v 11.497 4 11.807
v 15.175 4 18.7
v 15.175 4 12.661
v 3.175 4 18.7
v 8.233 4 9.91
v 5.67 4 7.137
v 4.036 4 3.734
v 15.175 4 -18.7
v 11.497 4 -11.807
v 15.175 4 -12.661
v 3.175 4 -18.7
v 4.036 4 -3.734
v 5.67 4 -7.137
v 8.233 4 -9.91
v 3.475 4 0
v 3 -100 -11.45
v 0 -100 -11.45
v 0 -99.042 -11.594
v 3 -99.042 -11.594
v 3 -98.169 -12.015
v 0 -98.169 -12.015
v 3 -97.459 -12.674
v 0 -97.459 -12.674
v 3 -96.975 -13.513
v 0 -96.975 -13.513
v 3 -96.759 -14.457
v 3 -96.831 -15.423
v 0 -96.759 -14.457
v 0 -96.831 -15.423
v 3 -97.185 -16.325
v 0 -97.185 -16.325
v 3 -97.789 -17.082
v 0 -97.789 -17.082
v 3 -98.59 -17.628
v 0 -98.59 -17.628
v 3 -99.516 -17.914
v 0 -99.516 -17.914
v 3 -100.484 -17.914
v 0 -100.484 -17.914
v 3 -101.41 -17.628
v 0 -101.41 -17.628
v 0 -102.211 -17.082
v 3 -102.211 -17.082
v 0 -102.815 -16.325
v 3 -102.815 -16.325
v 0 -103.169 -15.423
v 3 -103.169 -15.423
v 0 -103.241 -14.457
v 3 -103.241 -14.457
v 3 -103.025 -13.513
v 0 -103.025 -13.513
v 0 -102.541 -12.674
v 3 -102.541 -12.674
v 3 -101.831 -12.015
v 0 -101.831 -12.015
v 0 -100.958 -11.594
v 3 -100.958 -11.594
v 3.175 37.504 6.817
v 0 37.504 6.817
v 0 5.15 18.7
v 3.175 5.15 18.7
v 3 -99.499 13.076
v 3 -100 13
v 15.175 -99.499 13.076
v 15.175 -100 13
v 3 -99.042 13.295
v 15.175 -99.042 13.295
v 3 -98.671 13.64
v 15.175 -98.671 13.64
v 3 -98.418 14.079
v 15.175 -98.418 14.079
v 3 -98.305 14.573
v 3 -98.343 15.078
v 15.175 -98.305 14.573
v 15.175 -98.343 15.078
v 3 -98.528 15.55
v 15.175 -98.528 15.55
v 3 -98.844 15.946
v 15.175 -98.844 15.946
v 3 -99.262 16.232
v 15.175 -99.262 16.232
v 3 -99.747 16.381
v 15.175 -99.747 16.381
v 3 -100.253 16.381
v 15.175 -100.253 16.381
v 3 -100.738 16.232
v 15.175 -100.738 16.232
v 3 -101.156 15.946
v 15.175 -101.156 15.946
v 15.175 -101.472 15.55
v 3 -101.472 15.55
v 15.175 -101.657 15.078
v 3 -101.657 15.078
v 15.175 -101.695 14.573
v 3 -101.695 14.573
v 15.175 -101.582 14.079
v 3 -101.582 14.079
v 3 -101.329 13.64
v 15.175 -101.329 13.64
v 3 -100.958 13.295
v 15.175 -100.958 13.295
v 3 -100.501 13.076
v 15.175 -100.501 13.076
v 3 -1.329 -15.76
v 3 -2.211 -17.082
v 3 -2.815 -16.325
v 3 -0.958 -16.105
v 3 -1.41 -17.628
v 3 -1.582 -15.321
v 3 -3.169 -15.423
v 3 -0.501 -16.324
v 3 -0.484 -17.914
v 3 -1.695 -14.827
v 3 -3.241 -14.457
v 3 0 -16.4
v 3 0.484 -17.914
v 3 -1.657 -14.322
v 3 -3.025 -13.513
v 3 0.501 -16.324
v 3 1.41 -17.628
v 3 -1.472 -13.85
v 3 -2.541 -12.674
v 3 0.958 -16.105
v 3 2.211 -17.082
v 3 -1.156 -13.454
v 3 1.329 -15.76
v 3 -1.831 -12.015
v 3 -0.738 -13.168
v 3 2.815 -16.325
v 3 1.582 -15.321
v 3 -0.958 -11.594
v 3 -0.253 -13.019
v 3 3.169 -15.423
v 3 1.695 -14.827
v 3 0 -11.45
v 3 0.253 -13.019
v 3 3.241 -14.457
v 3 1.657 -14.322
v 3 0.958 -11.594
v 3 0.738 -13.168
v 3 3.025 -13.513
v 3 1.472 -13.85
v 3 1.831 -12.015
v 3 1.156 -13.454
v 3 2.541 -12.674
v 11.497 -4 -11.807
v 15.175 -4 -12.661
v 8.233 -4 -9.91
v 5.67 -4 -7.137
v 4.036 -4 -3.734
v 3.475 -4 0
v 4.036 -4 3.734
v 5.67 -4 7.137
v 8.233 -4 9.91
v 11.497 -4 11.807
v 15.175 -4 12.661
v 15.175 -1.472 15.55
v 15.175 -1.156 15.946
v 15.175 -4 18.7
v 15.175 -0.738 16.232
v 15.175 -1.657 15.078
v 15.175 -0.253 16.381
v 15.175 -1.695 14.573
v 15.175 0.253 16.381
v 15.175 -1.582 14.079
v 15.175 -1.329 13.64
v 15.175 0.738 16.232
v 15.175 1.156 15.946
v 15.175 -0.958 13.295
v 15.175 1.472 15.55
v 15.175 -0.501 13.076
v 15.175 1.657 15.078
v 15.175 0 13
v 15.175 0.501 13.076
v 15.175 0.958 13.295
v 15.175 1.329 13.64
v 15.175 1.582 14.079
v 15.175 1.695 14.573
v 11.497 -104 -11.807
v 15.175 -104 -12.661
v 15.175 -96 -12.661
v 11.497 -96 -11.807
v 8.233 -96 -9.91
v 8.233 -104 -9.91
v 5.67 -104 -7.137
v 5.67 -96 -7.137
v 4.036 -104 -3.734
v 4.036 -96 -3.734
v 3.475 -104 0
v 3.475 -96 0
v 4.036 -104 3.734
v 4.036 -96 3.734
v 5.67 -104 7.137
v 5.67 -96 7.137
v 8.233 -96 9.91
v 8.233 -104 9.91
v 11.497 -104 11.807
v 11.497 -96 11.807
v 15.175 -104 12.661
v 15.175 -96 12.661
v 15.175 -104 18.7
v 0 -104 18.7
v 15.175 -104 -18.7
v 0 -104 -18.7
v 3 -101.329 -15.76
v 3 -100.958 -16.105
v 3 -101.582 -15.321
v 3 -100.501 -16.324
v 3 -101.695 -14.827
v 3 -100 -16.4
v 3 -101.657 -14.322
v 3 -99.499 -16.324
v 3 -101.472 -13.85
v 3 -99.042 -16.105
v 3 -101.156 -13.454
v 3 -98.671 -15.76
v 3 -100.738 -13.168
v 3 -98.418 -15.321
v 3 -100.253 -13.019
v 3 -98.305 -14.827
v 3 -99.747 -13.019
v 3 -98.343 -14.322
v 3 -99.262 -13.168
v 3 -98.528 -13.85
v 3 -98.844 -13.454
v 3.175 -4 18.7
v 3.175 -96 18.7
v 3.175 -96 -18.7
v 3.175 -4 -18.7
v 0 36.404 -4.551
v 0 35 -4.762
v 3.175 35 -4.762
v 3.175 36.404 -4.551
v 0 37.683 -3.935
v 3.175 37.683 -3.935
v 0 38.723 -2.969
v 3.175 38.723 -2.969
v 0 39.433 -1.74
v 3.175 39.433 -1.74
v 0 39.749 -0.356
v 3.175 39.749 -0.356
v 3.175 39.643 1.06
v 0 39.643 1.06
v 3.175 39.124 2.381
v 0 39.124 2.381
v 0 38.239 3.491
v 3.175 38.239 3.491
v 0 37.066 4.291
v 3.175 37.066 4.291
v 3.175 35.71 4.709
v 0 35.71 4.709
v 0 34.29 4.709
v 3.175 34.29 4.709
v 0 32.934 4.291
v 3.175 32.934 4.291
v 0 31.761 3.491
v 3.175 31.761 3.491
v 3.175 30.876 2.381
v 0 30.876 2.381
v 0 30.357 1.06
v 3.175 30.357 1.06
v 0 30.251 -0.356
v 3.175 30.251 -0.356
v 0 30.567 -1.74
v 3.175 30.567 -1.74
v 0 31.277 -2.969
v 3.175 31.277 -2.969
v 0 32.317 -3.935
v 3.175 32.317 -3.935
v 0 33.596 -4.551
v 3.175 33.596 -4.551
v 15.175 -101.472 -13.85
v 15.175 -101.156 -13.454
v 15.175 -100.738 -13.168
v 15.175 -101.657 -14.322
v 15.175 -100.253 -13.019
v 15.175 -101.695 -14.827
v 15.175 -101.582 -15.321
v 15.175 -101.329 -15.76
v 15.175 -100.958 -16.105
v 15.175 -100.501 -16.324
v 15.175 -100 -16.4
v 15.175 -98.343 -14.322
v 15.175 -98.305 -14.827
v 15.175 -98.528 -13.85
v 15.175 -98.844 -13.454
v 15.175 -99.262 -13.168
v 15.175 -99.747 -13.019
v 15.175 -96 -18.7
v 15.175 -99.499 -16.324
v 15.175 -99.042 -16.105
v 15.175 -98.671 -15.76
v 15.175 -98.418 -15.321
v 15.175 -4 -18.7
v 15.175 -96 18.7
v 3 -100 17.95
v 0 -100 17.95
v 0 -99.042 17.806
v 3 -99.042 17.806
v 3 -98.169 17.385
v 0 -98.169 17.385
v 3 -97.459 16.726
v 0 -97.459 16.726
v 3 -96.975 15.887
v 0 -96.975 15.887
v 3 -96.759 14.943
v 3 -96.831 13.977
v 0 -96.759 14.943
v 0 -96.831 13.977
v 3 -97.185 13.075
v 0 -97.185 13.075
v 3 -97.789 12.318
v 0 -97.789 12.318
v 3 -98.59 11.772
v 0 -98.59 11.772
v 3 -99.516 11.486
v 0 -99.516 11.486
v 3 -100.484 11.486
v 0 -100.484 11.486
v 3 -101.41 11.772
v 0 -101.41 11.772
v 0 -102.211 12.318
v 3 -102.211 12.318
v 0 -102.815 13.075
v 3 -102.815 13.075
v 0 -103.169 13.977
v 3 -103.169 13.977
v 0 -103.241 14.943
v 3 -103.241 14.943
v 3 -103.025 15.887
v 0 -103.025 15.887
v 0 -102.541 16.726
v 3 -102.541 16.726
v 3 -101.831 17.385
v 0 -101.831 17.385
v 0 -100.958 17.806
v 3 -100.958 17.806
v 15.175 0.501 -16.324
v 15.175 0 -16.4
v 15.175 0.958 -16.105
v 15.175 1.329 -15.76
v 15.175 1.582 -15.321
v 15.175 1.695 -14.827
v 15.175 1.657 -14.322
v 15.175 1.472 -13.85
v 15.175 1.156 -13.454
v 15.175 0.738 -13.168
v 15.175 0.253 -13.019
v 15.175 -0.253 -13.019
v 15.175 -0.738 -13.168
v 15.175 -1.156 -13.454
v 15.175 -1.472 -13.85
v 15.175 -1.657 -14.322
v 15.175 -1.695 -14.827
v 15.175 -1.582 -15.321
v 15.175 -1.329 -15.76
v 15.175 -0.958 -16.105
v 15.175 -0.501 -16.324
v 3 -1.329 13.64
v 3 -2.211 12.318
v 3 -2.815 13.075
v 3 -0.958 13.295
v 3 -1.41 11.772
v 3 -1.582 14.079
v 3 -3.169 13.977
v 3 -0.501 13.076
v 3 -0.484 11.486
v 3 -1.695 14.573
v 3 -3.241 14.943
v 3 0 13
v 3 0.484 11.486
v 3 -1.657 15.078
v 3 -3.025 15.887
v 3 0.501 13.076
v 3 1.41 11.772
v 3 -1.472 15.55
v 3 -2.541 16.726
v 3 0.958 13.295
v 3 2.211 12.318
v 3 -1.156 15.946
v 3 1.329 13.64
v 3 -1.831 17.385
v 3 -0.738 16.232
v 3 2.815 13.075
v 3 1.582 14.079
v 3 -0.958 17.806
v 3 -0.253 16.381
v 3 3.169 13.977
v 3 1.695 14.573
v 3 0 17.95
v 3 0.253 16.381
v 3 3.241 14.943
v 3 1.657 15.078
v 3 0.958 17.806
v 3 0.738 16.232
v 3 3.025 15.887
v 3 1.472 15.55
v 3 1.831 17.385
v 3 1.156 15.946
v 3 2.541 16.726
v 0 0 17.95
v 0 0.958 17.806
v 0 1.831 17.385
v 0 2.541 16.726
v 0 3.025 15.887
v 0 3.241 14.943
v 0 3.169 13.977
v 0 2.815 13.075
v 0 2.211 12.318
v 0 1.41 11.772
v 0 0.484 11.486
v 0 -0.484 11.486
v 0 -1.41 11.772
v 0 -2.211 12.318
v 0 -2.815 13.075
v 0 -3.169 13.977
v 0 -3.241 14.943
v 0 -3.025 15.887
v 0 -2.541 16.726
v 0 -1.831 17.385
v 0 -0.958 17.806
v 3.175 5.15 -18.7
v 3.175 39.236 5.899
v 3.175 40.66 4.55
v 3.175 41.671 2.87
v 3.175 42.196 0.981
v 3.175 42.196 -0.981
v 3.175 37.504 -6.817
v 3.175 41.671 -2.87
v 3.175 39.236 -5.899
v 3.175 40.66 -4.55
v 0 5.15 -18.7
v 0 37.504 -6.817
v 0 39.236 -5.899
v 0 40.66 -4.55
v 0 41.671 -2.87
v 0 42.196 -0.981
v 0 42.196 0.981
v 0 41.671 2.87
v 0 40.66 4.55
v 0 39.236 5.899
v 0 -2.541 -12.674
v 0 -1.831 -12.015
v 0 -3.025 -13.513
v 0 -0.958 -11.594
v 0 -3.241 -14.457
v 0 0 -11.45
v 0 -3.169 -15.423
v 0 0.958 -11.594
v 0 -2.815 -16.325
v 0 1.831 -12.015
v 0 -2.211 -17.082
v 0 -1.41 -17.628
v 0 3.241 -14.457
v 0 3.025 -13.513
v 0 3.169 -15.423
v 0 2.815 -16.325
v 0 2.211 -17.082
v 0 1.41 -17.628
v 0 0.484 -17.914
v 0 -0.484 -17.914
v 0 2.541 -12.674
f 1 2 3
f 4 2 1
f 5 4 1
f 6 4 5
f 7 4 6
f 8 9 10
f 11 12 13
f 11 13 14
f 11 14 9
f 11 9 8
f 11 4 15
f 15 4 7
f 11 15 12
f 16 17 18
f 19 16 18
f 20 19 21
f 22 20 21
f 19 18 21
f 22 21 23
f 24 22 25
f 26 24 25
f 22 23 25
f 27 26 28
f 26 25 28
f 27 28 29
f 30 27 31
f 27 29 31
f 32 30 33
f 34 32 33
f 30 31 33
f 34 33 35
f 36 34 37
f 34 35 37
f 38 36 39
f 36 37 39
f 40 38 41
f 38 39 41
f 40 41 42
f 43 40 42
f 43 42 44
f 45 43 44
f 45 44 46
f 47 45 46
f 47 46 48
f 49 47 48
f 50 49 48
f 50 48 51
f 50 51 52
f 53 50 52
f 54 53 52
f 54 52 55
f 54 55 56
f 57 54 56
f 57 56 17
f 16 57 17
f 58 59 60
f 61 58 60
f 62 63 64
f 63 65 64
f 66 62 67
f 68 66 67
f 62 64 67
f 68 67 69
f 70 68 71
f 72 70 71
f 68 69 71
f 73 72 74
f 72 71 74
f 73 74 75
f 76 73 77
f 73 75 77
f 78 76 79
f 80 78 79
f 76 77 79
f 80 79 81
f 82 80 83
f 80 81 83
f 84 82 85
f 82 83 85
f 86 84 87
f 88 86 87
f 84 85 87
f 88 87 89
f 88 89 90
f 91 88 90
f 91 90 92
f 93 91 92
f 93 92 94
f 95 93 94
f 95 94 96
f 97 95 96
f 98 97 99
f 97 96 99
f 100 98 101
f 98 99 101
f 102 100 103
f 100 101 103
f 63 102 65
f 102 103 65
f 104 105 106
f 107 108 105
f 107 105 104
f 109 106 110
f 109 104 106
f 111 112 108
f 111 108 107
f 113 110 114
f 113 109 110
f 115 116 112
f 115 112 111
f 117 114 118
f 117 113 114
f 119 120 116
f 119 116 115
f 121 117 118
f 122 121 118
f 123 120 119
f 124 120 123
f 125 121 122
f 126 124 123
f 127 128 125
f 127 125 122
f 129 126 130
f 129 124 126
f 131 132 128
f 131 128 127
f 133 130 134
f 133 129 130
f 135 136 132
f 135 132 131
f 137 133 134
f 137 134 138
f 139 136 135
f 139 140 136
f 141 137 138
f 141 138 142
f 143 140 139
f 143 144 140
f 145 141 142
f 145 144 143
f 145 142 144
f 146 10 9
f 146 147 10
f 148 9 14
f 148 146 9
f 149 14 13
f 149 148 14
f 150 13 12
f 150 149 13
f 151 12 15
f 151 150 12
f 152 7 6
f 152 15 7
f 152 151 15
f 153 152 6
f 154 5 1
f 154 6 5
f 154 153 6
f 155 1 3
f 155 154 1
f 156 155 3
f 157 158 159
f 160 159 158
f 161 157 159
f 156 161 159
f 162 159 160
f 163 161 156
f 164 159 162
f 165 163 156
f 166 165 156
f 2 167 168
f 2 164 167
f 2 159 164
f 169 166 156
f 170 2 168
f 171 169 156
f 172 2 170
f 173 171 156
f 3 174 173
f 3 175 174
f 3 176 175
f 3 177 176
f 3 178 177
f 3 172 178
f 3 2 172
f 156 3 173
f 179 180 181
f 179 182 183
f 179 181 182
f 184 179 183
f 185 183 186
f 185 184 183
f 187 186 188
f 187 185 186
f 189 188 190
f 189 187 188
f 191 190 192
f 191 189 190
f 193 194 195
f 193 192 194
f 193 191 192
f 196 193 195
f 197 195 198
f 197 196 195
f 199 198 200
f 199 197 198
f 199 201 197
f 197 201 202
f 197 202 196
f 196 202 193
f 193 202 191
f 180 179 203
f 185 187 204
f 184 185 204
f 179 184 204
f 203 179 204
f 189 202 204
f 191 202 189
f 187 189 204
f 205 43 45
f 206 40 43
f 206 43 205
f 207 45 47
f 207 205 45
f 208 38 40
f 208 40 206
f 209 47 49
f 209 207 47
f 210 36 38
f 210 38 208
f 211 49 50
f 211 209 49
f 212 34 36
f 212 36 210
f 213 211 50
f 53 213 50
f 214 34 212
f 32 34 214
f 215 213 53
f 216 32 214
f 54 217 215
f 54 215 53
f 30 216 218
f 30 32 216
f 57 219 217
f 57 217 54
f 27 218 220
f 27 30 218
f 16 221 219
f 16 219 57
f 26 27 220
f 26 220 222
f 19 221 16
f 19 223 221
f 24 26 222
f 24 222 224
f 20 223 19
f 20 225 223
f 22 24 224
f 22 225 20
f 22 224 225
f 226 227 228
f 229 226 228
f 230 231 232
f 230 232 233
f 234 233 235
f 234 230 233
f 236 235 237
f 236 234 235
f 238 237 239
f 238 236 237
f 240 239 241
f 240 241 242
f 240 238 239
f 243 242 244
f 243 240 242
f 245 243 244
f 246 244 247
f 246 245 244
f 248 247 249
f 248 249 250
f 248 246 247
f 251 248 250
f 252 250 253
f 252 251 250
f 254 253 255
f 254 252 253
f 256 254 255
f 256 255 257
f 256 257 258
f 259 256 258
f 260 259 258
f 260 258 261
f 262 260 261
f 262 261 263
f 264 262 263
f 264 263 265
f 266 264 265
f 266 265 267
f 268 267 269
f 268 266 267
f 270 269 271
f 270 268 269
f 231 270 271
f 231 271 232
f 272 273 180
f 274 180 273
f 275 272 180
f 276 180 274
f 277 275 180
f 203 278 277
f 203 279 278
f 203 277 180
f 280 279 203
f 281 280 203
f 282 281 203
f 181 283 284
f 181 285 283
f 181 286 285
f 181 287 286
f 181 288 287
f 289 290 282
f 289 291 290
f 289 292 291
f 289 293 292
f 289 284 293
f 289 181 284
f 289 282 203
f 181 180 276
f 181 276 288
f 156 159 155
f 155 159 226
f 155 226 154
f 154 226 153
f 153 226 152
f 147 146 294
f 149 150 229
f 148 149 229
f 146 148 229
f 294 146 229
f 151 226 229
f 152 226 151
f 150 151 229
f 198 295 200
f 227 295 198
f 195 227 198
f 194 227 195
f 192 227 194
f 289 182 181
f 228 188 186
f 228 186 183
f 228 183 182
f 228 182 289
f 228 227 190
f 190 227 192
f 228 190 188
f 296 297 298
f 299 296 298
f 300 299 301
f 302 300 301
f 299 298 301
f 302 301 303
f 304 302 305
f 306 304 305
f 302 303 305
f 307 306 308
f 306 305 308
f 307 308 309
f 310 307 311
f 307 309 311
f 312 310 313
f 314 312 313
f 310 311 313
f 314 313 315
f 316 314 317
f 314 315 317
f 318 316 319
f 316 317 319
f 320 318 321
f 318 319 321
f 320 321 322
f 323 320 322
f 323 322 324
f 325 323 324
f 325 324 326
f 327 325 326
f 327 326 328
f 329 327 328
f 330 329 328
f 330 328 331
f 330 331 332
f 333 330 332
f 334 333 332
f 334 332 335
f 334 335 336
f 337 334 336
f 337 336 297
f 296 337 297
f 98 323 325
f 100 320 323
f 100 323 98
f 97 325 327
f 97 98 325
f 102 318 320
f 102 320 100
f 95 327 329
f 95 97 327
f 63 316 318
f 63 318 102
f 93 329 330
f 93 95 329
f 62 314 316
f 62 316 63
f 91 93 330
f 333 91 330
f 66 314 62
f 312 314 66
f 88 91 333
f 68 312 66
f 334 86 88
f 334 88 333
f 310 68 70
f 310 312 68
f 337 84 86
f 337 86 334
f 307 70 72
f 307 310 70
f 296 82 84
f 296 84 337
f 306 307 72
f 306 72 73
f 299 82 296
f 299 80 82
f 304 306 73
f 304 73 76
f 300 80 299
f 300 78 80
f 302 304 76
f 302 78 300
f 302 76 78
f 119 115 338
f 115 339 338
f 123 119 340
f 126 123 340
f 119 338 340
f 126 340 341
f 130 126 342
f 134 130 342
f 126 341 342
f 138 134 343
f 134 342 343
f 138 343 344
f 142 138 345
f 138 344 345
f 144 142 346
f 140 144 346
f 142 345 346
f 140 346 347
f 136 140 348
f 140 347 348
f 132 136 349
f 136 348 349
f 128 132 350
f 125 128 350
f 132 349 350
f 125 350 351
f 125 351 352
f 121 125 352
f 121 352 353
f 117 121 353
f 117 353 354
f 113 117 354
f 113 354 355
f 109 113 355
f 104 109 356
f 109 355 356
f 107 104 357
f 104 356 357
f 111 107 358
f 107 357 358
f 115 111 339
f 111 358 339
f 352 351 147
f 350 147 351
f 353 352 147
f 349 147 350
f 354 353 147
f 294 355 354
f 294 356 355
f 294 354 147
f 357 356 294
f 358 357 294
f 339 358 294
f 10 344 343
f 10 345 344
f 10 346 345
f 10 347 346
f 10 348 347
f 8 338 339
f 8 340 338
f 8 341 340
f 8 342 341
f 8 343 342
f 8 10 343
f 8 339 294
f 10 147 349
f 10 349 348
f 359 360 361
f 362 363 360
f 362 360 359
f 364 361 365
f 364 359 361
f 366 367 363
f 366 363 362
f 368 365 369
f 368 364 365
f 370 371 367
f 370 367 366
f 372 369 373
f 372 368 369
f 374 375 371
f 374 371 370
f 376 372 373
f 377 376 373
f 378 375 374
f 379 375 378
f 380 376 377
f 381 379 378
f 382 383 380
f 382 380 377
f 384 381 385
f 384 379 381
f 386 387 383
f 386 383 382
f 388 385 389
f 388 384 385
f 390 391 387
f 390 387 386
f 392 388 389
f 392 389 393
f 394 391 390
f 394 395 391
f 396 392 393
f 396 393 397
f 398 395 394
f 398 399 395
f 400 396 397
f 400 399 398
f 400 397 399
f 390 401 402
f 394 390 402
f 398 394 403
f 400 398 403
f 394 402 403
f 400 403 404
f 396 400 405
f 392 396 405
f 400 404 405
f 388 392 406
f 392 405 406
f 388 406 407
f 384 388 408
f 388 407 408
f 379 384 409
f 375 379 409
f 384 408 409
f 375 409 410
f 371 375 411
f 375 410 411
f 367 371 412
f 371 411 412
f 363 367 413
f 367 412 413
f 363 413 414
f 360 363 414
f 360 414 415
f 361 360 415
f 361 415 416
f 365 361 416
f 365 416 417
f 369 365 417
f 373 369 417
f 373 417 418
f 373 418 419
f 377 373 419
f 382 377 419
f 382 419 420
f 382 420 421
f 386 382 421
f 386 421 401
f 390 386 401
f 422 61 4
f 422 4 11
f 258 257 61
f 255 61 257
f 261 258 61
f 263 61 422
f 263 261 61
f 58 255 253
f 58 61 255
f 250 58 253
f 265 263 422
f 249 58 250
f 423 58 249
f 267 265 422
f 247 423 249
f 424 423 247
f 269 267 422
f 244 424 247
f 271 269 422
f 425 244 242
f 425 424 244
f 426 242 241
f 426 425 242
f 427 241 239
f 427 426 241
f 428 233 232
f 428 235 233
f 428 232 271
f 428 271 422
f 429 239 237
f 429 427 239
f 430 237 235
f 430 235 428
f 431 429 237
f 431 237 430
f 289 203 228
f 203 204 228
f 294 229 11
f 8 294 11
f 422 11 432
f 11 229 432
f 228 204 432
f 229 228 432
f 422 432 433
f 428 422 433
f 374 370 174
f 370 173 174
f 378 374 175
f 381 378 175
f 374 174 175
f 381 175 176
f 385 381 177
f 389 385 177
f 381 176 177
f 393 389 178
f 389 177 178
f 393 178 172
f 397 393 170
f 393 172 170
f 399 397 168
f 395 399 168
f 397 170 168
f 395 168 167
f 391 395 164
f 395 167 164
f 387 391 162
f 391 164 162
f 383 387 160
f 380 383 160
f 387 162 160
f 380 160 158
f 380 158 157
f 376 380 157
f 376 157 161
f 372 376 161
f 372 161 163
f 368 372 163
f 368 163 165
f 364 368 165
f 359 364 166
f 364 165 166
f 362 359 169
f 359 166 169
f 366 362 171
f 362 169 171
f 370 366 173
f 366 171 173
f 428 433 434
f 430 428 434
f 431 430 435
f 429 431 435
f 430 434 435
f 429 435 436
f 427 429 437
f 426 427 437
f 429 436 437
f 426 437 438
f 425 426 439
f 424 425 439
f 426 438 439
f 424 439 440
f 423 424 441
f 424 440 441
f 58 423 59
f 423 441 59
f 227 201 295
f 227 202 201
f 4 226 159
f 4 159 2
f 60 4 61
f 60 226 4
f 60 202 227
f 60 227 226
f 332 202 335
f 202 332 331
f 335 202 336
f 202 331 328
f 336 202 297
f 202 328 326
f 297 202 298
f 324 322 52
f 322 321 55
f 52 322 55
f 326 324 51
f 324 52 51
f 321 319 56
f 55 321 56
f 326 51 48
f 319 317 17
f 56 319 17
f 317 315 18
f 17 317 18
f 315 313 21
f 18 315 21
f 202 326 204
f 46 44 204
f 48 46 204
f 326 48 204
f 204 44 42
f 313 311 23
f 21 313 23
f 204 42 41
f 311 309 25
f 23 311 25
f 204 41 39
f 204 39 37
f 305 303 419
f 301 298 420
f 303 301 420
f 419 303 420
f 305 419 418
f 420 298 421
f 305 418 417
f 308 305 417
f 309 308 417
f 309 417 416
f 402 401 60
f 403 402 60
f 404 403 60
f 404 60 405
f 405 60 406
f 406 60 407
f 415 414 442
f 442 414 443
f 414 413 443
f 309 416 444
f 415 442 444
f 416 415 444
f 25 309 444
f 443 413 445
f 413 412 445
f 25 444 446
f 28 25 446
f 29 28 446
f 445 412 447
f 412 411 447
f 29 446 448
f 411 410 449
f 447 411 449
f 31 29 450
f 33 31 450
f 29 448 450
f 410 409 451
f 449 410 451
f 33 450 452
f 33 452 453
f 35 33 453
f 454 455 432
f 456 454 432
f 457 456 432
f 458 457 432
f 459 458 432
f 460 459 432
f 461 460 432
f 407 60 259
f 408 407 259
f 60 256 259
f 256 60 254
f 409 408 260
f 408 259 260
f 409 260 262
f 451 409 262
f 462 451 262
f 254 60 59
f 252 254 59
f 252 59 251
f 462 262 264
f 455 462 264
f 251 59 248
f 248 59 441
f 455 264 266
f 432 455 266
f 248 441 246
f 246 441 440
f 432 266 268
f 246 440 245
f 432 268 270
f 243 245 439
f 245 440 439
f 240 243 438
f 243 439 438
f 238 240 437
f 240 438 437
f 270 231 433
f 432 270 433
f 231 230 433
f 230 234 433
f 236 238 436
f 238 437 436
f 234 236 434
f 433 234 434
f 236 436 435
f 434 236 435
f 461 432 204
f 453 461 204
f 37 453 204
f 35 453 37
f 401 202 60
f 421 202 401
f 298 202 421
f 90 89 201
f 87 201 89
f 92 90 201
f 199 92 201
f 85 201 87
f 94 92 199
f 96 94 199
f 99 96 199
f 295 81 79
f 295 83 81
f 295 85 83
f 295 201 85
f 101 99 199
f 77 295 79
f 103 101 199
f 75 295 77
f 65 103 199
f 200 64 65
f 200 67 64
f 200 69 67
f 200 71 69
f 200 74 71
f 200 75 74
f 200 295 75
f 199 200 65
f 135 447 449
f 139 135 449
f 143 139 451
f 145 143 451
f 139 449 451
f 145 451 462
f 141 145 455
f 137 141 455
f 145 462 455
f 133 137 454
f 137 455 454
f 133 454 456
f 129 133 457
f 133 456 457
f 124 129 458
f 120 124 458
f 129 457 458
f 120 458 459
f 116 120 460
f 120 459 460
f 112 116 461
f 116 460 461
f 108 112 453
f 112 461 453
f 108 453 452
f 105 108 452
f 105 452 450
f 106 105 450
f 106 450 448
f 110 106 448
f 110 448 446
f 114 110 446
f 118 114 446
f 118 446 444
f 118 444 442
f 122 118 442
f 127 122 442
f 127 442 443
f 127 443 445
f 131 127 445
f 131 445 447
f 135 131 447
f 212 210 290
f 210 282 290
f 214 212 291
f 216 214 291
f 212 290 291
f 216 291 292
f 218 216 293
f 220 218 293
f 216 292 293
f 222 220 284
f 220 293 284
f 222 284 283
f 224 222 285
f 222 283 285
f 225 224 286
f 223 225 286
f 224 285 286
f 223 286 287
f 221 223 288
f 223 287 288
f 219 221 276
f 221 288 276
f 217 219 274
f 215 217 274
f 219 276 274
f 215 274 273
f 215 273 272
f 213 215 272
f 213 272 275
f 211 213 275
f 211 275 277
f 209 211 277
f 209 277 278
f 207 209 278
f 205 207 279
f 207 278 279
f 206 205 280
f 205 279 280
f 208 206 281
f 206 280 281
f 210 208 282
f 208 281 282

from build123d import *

# Parameters (mm, degrees)
SKETCH1_R                      = 4.7625
BOSS_EXTRUDE1_DEPTH            = 3.175
SKETCH2_W                      = 37.4
SKETCH2_H                      = 8
BOSS_EXTRUDE2_DEPTH            = 12
CUT_EXTRUDE1_DEPTH             = 107.751911575
CUT_EXTRUDE1_DEPTH_BACK        = 107.751911575
SKETCH3_R                      = 12.7
CBORE_FOR_M3_SHCS1_D           = 3.4
CBORE_FOR_M3_SHCS1_CBORE_D     = 6.5
CBORE_FOR_M3_SHCS1_CBORE_DEPTH = 3


with BuildPart() as part:
    # Sketch1 → Boss-Extrude1 (new body)
    with BuildSketch(Plane(origin=(0, 0, 0), x_dir=(0, 0, -1), z_dir=(1, 0, 0))):
        with BuildLine():
            Line((-18.7, -104), (18.7, -104))
            Line((18.7, -104), (18.7, 5.15))
            Line((18.7, 5.15), (6.817247269, 37.503806287))
            ThreePointArc((6.817247269, 37.503806287), (0, 42.2625), (-6.817247269, 37.503806287))
            Line((-6.817247269, 37.503806287), (-18.7, 5.15))
            Line((-18.7, 5.15), (-18.7, -104))
        make_face()
        with Locations((0, 35)):
            Circle(SKETCH1_R, mode=Mode.SUBTRACT)
    extrude(amount=BOSS_EXTRUDE1_DEPTH)

    # Sketch2 → Boss-Extrude2 (add)
    with BuildSketch(Plane(origin=(3.175, 0, 0), x_dir=(0, 0, -1), z_dir=(1, 0, 0))):
        Rectangle(SKETCH2_W, SKETCH2_H)
        with Locations((0, -100)):
            Rectangle(SKETCH2_W, SKETCH2_H)
    extrude(amount=BOSS_EXTRUDE2_DEPTH)

    # Sketch3 → Cut-Extrude1 (cut, two sides: drawn at the far end of the back side and taken through both)
    with BuildSketch(Plane(origin=(0, 0, 0), x_dir=(1, 0, 0), z_dir=(0, 1, 0)).offset(-CUT_EXTRUDE1_DEPTH_BACK)):
        with Locations((16.175, 0)):
            Circle(SKETCH3_R)
    extrude(amount=CUT_EXTRUDE1_DEPTH + CUT_EXTRUDE1_DEPTH_BACK, mode=Mode.SUBTRACT)

    # CBORE for M3 SHCS1 (through all)
    with Locations(Plane.ZY):
        with Locations((-14.7, 0), (14.7, 0), (14.7, -100), (-14.7, -100)):
            CounterBoreHole(CBORE_FOR_M3_SHCS1_D / 2, CBORE_FOR_M3_SHCS1_CBORE_D / 2, CBORE_FOR_M3_SHCS1_CBORE_DEPTH)


solid = part.part
